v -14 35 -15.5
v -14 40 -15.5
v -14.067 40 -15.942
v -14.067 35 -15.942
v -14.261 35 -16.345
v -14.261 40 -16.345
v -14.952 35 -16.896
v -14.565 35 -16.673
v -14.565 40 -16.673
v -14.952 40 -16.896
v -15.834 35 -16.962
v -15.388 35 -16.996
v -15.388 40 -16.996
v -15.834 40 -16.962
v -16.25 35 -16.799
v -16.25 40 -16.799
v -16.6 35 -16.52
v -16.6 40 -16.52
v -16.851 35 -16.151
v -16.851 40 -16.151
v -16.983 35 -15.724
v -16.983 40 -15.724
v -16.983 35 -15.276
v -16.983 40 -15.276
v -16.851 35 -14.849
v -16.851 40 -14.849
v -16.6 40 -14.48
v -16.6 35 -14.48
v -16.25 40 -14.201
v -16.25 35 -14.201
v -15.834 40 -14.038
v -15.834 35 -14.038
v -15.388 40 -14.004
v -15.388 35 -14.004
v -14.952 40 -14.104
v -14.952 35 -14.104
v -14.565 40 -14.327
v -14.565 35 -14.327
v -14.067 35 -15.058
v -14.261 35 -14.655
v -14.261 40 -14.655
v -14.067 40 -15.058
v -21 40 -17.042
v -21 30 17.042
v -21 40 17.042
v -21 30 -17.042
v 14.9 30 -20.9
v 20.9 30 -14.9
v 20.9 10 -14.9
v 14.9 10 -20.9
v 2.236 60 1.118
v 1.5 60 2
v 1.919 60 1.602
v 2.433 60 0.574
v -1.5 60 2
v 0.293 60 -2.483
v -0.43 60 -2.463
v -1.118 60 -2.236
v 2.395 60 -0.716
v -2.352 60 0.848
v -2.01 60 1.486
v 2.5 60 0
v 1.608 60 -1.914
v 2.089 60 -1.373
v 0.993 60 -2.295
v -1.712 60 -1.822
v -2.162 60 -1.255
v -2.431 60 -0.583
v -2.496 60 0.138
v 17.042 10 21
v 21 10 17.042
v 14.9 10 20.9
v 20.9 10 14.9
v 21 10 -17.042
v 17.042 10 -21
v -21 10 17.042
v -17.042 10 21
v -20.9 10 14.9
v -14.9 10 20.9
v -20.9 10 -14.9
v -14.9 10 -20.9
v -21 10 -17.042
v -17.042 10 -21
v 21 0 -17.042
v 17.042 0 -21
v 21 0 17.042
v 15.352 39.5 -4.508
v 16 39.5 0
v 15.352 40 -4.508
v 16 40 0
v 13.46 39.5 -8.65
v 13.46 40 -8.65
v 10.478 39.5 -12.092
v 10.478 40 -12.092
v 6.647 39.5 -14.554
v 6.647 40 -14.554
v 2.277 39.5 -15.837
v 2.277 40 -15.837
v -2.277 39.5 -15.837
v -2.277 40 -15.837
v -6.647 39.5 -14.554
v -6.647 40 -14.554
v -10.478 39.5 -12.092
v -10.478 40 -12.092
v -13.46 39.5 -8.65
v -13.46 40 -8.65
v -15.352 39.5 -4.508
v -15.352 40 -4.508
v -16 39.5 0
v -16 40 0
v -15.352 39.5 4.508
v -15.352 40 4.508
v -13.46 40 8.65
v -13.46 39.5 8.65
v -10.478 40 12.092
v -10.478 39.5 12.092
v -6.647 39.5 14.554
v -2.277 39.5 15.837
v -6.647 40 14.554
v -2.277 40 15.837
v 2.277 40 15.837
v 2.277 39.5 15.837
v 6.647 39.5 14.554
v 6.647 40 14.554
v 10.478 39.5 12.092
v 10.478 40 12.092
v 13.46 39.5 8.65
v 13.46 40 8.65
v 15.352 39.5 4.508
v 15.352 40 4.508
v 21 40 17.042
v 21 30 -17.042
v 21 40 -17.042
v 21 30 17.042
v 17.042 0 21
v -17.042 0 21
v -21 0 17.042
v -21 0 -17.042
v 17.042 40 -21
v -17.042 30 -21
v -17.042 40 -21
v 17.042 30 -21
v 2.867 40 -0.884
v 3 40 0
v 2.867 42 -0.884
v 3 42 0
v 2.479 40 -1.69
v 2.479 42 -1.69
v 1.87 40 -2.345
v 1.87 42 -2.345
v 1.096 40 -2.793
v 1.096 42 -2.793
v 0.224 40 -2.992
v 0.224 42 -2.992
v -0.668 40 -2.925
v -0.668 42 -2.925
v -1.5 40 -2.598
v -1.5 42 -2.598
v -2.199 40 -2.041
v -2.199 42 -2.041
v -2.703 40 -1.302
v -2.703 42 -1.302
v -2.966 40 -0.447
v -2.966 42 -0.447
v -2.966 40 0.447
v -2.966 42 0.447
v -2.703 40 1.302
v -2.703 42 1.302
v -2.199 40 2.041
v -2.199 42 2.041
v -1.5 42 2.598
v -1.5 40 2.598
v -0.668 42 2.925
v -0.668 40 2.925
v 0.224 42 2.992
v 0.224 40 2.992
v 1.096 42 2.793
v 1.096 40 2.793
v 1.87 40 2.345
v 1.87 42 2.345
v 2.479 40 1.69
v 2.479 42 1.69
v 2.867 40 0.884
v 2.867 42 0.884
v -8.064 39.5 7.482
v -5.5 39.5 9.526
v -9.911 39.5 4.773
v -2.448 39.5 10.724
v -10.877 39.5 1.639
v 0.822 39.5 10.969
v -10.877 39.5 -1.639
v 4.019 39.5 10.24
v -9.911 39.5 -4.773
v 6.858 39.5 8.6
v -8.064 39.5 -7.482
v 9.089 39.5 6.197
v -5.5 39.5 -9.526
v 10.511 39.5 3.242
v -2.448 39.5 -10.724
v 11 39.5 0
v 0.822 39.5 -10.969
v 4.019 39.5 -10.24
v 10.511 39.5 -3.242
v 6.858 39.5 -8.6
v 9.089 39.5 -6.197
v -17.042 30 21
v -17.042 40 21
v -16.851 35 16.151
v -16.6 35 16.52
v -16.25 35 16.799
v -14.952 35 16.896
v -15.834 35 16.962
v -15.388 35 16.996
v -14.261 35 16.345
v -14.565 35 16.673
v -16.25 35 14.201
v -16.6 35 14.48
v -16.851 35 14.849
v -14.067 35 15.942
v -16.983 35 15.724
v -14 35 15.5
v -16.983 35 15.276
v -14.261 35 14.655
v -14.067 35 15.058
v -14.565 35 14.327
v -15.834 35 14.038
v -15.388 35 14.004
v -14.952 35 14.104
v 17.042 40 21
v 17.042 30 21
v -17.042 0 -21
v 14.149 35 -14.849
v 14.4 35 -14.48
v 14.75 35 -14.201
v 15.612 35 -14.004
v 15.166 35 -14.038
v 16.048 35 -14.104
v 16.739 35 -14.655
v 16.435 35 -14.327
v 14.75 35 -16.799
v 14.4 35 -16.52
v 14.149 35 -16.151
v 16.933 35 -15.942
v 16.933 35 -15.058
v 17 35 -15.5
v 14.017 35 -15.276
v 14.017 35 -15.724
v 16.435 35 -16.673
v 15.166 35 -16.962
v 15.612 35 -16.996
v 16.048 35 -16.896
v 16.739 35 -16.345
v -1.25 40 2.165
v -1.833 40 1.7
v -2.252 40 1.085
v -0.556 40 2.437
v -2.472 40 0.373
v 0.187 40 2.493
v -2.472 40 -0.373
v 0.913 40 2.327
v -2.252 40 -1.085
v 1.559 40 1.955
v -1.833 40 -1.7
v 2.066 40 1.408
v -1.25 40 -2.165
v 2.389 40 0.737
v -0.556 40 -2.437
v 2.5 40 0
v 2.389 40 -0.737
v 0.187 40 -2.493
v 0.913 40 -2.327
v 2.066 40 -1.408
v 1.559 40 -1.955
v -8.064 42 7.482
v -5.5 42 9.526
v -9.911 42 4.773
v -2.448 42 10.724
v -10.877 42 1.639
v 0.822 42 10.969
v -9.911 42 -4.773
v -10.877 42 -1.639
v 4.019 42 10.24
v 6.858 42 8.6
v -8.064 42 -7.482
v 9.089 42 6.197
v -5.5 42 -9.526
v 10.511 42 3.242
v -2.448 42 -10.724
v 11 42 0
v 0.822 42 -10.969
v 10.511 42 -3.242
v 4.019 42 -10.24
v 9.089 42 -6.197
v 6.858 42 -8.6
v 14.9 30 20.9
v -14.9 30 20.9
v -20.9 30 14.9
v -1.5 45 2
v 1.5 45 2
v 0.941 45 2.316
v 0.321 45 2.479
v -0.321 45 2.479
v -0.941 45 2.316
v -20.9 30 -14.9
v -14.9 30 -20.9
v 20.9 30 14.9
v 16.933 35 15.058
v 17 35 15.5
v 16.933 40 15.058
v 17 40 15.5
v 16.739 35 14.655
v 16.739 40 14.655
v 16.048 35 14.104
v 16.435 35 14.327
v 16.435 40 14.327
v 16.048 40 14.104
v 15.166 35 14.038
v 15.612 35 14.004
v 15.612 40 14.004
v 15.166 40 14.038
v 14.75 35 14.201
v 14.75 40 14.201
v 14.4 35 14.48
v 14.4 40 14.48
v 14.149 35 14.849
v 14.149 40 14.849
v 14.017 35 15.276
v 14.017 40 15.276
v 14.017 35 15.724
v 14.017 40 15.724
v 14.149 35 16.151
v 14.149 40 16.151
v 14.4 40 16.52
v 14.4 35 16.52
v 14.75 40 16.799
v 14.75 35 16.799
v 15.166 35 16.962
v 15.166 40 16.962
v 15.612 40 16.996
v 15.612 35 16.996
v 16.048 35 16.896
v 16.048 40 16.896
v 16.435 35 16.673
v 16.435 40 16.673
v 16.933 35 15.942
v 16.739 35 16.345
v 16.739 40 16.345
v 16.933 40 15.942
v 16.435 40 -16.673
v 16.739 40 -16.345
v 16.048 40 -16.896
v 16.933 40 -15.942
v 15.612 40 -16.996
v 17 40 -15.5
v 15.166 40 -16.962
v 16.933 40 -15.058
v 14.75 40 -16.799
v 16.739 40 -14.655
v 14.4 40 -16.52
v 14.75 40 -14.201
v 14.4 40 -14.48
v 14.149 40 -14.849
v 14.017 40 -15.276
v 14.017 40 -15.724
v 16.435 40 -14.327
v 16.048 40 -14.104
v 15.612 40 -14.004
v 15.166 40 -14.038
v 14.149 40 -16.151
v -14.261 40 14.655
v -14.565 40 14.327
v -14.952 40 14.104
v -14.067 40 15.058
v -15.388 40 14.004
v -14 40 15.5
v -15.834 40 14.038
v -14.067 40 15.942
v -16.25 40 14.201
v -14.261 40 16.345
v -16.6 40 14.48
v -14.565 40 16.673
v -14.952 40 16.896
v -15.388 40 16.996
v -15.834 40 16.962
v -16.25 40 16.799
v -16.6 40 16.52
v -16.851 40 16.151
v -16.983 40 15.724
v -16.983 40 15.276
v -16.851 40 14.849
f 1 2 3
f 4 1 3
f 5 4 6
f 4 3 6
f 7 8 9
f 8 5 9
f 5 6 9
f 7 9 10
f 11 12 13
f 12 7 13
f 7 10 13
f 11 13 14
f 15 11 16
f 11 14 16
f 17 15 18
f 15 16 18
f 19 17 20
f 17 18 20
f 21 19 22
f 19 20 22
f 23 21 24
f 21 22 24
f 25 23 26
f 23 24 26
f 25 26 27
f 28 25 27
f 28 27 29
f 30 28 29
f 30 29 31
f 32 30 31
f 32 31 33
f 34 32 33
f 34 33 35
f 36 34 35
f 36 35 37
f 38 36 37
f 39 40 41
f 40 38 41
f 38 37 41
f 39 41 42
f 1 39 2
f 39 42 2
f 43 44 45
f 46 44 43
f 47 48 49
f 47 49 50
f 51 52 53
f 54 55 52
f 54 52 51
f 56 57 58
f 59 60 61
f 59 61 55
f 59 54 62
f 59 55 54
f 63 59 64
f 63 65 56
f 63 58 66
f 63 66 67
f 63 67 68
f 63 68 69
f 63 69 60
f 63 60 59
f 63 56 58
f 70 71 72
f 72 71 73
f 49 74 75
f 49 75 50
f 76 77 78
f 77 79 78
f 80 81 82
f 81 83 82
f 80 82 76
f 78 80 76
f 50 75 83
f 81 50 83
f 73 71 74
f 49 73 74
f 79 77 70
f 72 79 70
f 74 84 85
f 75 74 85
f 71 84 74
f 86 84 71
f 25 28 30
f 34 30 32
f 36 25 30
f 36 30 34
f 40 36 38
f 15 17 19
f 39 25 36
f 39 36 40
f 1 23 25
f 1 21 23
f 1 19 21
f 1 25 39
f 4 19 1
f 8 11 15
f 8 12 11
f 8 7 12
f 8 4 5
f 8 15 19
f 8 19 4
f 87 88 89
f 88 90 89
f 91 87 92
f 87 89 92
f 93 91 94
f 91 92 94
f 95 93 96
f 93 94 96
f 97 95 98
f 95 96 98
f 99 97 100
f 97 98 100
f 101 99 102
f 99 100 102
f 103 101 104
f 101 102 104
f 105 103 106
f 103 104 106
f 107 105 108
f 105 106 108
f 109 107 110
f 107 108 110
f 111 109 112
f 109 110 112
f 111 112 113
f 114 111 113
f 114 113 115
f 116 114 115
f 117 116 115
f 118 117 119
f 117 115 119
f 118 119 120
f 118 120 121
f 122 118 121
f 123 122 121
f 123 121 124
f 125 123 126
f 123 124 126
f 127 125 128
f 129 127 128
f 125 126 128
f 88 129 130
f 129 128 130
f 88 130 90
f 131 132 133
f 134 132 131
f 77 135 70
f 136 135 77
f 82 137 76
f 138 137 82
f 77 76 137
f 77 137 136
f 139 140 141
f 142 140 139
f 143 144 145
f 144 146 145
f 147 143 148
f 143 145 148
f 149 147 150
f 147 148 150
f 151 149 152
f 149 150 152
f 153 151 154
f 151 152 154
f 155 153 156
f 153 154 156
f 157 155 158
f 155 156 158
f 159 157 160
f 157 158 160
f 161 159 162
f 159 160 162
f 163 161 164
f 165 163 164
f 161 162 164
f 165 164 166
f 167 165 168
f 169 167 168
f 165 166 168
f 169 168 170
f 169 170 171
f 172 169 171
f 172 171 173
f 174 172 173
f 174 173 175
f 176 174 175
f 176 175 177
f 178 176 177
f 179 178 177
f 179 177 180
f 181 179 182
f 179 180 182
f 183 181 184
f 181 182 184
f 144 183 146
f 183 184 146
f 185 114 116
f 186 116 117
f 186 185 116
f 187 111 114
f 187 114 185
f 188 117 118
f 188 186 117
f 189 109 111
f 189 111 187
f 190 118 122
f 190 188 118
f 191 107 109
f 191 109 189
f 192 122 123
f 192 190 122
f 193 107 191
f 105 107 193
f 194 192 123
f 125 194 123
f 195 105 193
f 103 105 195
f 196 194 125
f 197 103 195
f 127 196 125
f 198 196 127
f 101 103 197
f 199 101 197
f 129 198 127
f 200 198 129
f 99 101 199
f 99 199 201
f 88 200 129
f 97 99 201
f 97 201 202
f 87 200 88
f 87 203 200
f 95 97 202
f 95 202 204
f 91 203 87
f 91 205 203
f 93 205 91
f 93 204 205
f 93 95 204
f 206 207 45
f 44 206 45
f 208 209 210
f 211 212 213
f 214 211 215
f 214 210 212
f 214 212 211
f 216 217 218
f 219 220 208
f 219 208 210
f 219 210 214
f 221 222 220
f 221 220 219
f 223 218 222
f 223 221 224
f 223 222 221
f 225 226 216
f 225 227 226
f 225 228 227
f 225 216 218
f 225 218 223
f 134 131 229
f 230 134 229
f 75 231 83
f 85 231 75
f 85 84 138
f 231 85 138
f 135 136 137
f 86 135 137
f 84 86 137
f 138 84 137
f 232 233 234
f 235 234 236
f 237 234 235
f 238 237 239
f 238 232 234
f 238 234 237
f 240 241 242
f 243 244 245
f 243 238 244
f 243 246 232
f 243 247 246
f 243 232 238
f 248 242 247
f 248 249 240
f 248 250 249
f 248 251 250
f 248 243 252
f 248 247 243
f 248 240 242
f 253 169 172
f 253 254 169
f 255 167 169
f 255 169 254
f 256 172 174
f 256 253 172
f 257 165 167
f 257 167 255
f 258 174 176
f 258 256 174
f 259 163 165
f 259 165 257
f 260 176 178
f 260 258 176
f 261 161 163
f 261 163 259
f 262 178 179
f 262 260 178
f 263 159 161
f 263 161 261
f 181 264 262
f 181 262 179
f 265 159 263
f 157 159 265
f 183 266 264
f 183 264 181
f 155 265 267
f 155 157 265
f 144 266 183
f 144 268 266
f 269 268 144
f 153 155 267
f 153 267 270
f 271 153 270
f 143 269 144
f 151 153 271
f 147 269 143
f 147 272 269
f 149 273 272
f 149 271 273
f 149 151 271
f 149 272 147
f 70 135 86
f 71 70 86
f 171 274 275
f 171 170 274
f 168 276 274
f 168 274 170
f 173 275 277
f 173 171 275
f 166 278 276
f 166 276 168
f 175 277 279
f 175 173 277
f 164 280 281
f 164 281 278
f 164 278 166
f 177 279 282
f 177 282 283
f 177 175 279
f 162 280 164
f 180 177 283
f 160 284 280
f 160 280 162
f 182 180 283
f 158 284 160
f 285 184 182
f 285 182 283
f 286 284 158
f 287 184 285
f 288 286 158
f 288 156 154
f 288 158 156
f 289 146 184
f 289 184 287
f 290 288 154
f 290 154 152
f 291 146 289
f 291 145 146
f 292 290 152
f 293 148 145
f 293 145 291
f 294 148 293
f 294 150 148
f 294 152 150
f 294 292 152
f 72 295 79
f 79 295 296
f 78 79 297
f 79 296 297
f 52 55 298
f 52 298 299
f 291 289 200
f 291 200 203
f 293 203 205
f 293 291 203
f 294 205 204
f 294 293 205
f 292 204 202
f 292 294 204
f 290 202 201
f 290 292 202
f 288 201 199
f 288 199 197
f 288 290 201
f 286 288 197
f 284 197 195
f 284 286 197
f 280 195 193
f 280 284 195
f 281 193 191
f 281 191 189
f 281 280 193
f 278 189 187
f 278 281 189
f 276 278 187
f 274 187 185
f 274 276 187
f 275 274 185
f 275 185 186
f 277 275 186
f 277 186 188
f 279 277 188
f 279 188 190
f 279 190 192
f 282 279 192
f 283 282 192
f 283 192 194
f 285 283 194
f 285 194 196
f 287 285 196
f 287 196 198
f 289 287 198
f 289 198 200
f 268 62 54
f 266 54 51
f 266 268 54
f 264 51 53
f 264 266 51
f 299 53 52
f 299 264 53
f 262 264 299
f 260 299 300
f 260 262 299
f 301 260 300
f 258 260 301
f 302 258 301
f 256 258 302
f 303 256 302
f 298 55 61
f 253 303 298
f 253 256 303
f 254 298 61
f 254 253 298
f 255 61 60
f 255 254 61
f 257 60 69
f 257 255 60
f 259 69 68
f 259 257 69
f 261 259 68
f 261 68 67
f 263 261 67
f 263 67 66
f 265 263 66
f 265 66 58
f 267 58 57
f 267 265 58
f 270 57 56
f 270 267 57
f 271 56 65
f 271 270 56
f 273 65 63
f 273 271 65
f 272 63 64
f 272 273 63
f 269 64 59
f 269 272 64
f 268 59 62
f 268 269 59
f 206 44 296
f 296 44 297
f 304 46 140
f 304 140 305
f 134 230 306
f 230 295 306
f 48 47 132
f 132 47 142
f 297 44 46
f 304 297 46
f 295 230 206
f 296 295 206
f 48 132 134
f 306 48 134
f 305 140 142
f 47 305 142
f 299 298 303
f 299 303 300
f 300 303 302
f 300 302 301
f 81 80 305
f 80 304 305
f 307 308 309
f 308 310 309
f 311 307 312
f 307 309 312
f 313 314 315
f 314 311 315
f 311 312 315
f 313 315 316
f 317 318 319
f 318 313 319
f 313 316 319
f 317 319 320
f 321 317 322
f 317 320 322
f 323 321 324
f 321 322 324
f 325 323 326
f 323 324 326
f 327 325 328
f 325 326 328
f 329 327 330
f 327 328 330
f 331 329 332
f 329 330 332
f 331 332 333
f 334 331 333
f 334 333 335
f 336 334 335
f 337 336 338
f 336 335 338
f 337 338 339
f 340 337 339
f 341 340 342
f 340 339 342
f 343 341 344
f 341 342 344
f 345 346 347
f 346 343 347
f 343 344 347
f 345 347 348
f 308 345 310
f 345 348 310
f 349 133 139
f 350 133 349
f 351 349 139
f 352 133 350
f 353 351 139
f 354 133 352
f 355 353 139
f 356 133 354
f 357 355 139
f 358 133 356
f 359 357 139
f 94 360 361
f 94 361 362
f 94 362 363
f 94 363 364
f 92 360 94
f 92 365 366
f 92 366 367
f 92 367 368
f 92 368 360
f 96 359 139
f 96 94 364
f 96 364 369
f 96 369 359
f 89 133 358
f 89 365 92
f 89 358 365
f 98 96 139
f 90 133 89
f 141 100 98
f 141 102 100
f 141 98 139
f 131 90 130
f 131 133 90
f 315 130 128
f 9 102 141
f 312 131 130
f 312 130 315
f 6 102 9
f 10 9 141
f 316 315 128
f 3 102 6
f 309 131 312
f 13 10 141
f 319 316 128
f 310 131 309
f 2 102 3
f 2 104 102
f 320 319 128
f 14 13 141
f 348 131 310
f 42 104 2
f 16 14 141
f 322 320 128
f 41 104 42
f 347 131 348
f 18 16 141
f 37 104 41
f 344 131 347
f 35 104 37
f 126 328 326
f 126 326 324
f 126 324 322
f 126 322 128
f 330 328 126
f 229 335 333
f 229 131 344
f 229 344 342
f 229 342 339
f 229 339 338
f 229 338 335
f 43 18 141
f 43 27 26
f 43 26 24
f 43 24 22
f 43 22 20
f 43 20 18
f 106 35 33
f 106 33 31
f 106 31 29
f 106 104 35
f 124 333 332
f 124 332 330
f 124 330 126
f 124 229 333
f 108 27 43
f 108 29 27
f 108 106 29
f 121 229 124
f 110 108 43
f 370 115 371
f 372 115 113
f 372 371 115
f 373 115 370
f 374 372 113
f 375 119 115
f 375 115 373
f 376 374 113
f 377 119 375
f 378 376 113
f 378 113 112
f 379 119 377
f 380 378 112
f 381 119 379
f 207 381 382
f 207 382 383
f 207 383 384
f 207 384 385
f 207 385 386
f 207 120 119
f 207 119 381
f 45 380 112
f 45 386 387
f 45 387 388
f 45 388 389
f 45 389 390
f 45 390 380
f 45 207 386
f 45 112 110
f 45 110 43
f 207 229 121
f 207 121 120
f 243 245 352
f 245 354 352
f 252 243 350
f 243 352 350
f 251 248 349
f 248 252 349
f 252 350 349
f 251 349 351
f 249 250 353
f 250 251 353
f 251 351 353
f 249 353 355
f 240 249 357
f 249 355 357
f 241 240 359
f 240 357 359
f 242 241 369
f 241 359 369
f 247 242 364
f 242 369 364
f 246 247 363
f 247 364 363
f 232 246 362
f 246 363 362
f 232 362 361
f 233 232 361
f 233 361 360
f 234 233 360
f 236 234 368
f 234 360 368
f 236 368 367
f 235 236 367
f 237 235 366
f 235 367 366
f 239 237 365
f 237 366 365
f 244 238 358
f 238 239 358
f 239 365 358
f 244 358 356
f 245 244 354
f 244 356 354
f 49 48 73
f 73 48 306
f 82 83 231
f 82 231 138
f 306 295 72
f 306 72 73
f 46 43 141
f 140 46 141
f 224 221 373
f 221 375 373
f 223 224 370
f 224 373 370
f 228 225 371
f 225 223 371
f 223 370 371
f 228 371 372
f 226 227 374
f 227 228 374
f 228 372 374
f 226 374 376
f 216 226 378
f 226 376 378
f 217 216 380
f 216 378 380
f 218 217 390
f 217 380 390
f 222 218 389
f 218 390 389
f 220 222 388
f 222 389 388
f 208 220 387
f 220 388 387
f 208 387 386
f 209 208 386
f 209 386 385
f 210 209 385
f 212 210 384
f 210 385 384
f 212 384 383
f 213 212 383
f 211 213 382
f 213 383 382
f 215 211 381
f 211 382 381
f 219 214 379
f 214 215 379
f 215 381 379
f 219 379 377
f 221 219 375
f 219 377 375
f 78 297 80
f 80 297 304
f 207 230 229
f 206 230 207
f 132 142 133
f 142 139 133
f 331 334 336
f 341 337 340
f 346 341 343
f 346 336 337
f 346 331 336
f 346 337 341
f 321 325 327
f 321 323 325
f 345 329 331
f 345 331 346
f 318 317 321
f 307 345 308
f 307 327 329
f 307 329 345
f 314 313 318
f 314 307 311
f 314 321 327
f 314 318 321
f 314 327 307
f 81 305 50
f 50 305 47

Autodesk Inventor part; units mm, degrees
ref_plane "YZ Plane" through (0, 0, 0) normal (1, 0, 0) x (0, 1, 0)
ref_plane "XZ Plane" through (0, 0, 0) normal (0, 1, 0) x (-1, 0, 0)
sketch "Sketch1" plane through (0, 0, 0) normal (0, 1, 0) x (-1, 0, 0)
  line L0 (-21, 21) -> (21, 21)
  line L1 (21, 21) -> (21, -21)
  line L2 (21, -21) -> (-21, -21)
  line L3 (-21, -21) -> (-21, 21)
  line L4 (-21, 21) -> (21, -21) construction
  line L5 (21, 21) -> (-21, -21) construction
  point P0 (0, 0)
  dimension "d0" = 42
  dimension "d1" = 42
extrude "Extrusion1" add sketch "Sketch1" along normal blind 40
ref_plane "Work Plane1" through (0, 20, 0) normal (0, 1, 0) x (1, 0, 0)
sketch "Sketch2" plane through (0, 40, 0) normal (0, 1, 0) x (1, 0, 0)
  line L0 (0, -38.0423) -> (-38.0423, 0)
  line L1 (-38.0423, 0) -> (0, 38.0423)
  line L2 (0, 38.0423) -> (38.0423, 0)
  line L3 (38.0423, 0) -> (0, -38.0423)
  line L4 (0, -38.0423) -> (0, 38.0423) construction
  line L5 (-38.0423, 0) -> (38.0423, 0) construction
  line L6 (-21, 21) -> (-21, -21) projected
  circle A0 centre (0, 0) radius 250
  dimension "d4" = 53.8
  dimension "d5" = 53.8
  dimension "d6" = 500
extrude "Extrusion2" cut sketch "Sketch2" against normal blind 10
sketch "Sketch3" plane through (0, 20, 0) normal (0, 1, 0) x (1, 0, 0)
  line L0 (-20.9, -20.9) -> (20.9, -20.9)
  line L1 (20.9, -20.9) -> (20.9, 20.9)
  line L2 (20.9, 20.9) -> (-20.9, 20.9)
  line L3 (-20.9, 20.9) -> (-20.9, -20.9)
  line L4 (-21, -21) -> (-21, -17.0423) projected
  line L5 (21, -21) -> (17.0423, -21) projected
  line L6 (21, 21) -> (21, 17.0423) projected
  line L7 (-21, 21) -> (-17.0423, 21) projected
  circle A0 centre (0, 0) radius 200
  dimension "d9" = 0.1
  dimension "d10" = 0.1
  dimension "d11" = 0.1
  dimension "d12" = 0.1
  dimension "d13" = 400
extrude "Extrusion3" cut sketch "Sketch3" along normal up to surface (10 mm away)
chamfer "Chamfer1" distance 6 angle 45 4 edges at (20.9, 25, 20.9) (20.9, 25, -20.9) (-20.9, 25, 20.9) (-20.9, 25, -20.9)
mirror "Mirror1" about plane through (0, 20, 0) normal (0, 1, 0) of "Extrusion3", "Extrusion2", "Chamfer1"
sketch "Sketch4" plane through (0, 40, 0) normal (0, 1, 0) x (1, 0, 0)
  circle A0 centre (0, 0) radius 11
  dimension "d19" = 22
extrude "Extrusion4" add sketch "Sketch4" along normal blind 2
sketch "Sketch5" plane through (0, 40, 0) normal (0, 1, 0) x (1, 0, 0)
  circle A0 centre (0, 0) radius 11 projected
  line L0 (17.0423, -21) -> (21, -17.0423) projected
  line L1 (21, -17.0423) -> (21, 17.0423) projected
  line L2 (21, 17.0423) -> (17.0423, 21) projected
  line L3 (17.0423, 21) -> (-17.0423, 21) projected
  line L4 (-17.0423, 21) -> (-21, 17.0423) projected
  line L5 (-21, 17.0423) -> (-21, -17.0423) projected
  line L6 (-21, -17.0423) -> (-17.0423, -21) projected
  line L7 (-17.0423, -21) -> (17.0423, -21) projected
  circle A1 centre (0, 0) radius 16
  dimension "d22" = 32
extrude "Extrusion5" cut sketch "Sketch5" against normal blind 0.5 contours A1
sketch "Sketch6" plane through (0, 42, 0) normal (0, 1, 0) x (1, 0, 0)
  circle A0 centre (0, 0) radius 3
  dimension "d25" = 6
extrude "Extrusion6" cut sketch "Sketch6" against normal blind 2
sketch "Sketch8" plane through (0, 40, 0) normal (0, 1, 0) x (1, 0, 0)
  circle A0 centre (0, 0) radius 16 construction
  line L0 (17.0423, -21) -> (21, -17.0423) construction
  line L1 (21, -17.0423) -> (21, 17.0423) construction
  line L2 (21, 17.0423) -> (17.0423, 21) construction
  line L3 (17.0423, 21) -> (-17.0423, 21) construction
  line L4 (-17.0423, 21) -> (-21, 17.0423) construction
  line L5 (-21, 17.0423) -> (-21, -17.0423) construction
  line L6 (-21, -17.0423) -> (-17.0423, -21) construction
  line L7 (-17.0423, -21) -> (17.0423, -21) construction
  line L8 (-15.5, -15.5) -> (15.5, -15.5) construction
  line L9 (15.5, -15.5) -> (15.5, 15.5) construction
  line L10 (15.5, 15.5) -> (-15.5, 15.5) construction
  line L11 (-15.5, 15.5) -> (-15.5, -15.5) construction
  line L12 (-15.5, -15.5) -> (15.5, 15.5) construction
  line L13 (15.5, -15.5) -> (-15.5, 15.5) construction
  circle A1 centre (-15.5, 15.5) radius 1.5
  circle A2 centre (15.5, 15.5) radius 1.5
  circle A3 centre (15.5, -15.5) radius 1.5
  circle A4 centre (-15.5, -15.5) radius 1.5
  dimension "d36" = 31
  dimension "d37" = 31
  dimension "d38" = 3
  dimension "d39" = 3
  dimension "d40" = 3
  dimension "d41" = 3
extrude "Extrusion8" cut sketch "Sketch8" against normal blind 5
thread "Thread2" size "M3x0.5" class "6H" standard "ANSI Metric M Profile" full length
sketch "Sketch9" plane through (0, 40, 0) normal (0, 1, 0) x (1, 0, 0)
  circle A0 centre (0, 0) radius 2.5
  dimension "d49" = 5
extrude "Extrusion9" add sketch "Sketch9" along normal blind 20
pattern_circular "Circular Pattern2" count 4 over 360 about axis through (0, 40, 0) along (0, 1, 0) of "Extrusion8"
sketch "Sketch10" plane through (0, 60, 0) normal (0, 1, 0) x (1, 0, 0)
  circle A0 centre (0, 0) radius 2.5 projected
  circle A1 centre (0, 0) radius 2.5 projected
  line L0 (-1.5, -2) -> (1.5, -2)
  line L1 (1.5, -2) -> (1.5, -2.5)
  line L2 (1.5, -2.5) -> (-1.5, -2.5)
  line L3 (-1.5, -2.5) -> (-1.5, -2)
  circle A2 centre (0, 0) radius 2.5 projected
  dimension "d55" = 0.5
extrude "Extrusion10" cut sketch "Sketch10" against normal blind 15 contours L0 A0 | A0 L2 L3 | L1 L2 A0 picked at (0.3466, -2.0912)
equation "\"d9\" = d10"
equation "\"d11\" = d10"
equation "\"d12\" = d10"
properties part number "nema17_40mm"
